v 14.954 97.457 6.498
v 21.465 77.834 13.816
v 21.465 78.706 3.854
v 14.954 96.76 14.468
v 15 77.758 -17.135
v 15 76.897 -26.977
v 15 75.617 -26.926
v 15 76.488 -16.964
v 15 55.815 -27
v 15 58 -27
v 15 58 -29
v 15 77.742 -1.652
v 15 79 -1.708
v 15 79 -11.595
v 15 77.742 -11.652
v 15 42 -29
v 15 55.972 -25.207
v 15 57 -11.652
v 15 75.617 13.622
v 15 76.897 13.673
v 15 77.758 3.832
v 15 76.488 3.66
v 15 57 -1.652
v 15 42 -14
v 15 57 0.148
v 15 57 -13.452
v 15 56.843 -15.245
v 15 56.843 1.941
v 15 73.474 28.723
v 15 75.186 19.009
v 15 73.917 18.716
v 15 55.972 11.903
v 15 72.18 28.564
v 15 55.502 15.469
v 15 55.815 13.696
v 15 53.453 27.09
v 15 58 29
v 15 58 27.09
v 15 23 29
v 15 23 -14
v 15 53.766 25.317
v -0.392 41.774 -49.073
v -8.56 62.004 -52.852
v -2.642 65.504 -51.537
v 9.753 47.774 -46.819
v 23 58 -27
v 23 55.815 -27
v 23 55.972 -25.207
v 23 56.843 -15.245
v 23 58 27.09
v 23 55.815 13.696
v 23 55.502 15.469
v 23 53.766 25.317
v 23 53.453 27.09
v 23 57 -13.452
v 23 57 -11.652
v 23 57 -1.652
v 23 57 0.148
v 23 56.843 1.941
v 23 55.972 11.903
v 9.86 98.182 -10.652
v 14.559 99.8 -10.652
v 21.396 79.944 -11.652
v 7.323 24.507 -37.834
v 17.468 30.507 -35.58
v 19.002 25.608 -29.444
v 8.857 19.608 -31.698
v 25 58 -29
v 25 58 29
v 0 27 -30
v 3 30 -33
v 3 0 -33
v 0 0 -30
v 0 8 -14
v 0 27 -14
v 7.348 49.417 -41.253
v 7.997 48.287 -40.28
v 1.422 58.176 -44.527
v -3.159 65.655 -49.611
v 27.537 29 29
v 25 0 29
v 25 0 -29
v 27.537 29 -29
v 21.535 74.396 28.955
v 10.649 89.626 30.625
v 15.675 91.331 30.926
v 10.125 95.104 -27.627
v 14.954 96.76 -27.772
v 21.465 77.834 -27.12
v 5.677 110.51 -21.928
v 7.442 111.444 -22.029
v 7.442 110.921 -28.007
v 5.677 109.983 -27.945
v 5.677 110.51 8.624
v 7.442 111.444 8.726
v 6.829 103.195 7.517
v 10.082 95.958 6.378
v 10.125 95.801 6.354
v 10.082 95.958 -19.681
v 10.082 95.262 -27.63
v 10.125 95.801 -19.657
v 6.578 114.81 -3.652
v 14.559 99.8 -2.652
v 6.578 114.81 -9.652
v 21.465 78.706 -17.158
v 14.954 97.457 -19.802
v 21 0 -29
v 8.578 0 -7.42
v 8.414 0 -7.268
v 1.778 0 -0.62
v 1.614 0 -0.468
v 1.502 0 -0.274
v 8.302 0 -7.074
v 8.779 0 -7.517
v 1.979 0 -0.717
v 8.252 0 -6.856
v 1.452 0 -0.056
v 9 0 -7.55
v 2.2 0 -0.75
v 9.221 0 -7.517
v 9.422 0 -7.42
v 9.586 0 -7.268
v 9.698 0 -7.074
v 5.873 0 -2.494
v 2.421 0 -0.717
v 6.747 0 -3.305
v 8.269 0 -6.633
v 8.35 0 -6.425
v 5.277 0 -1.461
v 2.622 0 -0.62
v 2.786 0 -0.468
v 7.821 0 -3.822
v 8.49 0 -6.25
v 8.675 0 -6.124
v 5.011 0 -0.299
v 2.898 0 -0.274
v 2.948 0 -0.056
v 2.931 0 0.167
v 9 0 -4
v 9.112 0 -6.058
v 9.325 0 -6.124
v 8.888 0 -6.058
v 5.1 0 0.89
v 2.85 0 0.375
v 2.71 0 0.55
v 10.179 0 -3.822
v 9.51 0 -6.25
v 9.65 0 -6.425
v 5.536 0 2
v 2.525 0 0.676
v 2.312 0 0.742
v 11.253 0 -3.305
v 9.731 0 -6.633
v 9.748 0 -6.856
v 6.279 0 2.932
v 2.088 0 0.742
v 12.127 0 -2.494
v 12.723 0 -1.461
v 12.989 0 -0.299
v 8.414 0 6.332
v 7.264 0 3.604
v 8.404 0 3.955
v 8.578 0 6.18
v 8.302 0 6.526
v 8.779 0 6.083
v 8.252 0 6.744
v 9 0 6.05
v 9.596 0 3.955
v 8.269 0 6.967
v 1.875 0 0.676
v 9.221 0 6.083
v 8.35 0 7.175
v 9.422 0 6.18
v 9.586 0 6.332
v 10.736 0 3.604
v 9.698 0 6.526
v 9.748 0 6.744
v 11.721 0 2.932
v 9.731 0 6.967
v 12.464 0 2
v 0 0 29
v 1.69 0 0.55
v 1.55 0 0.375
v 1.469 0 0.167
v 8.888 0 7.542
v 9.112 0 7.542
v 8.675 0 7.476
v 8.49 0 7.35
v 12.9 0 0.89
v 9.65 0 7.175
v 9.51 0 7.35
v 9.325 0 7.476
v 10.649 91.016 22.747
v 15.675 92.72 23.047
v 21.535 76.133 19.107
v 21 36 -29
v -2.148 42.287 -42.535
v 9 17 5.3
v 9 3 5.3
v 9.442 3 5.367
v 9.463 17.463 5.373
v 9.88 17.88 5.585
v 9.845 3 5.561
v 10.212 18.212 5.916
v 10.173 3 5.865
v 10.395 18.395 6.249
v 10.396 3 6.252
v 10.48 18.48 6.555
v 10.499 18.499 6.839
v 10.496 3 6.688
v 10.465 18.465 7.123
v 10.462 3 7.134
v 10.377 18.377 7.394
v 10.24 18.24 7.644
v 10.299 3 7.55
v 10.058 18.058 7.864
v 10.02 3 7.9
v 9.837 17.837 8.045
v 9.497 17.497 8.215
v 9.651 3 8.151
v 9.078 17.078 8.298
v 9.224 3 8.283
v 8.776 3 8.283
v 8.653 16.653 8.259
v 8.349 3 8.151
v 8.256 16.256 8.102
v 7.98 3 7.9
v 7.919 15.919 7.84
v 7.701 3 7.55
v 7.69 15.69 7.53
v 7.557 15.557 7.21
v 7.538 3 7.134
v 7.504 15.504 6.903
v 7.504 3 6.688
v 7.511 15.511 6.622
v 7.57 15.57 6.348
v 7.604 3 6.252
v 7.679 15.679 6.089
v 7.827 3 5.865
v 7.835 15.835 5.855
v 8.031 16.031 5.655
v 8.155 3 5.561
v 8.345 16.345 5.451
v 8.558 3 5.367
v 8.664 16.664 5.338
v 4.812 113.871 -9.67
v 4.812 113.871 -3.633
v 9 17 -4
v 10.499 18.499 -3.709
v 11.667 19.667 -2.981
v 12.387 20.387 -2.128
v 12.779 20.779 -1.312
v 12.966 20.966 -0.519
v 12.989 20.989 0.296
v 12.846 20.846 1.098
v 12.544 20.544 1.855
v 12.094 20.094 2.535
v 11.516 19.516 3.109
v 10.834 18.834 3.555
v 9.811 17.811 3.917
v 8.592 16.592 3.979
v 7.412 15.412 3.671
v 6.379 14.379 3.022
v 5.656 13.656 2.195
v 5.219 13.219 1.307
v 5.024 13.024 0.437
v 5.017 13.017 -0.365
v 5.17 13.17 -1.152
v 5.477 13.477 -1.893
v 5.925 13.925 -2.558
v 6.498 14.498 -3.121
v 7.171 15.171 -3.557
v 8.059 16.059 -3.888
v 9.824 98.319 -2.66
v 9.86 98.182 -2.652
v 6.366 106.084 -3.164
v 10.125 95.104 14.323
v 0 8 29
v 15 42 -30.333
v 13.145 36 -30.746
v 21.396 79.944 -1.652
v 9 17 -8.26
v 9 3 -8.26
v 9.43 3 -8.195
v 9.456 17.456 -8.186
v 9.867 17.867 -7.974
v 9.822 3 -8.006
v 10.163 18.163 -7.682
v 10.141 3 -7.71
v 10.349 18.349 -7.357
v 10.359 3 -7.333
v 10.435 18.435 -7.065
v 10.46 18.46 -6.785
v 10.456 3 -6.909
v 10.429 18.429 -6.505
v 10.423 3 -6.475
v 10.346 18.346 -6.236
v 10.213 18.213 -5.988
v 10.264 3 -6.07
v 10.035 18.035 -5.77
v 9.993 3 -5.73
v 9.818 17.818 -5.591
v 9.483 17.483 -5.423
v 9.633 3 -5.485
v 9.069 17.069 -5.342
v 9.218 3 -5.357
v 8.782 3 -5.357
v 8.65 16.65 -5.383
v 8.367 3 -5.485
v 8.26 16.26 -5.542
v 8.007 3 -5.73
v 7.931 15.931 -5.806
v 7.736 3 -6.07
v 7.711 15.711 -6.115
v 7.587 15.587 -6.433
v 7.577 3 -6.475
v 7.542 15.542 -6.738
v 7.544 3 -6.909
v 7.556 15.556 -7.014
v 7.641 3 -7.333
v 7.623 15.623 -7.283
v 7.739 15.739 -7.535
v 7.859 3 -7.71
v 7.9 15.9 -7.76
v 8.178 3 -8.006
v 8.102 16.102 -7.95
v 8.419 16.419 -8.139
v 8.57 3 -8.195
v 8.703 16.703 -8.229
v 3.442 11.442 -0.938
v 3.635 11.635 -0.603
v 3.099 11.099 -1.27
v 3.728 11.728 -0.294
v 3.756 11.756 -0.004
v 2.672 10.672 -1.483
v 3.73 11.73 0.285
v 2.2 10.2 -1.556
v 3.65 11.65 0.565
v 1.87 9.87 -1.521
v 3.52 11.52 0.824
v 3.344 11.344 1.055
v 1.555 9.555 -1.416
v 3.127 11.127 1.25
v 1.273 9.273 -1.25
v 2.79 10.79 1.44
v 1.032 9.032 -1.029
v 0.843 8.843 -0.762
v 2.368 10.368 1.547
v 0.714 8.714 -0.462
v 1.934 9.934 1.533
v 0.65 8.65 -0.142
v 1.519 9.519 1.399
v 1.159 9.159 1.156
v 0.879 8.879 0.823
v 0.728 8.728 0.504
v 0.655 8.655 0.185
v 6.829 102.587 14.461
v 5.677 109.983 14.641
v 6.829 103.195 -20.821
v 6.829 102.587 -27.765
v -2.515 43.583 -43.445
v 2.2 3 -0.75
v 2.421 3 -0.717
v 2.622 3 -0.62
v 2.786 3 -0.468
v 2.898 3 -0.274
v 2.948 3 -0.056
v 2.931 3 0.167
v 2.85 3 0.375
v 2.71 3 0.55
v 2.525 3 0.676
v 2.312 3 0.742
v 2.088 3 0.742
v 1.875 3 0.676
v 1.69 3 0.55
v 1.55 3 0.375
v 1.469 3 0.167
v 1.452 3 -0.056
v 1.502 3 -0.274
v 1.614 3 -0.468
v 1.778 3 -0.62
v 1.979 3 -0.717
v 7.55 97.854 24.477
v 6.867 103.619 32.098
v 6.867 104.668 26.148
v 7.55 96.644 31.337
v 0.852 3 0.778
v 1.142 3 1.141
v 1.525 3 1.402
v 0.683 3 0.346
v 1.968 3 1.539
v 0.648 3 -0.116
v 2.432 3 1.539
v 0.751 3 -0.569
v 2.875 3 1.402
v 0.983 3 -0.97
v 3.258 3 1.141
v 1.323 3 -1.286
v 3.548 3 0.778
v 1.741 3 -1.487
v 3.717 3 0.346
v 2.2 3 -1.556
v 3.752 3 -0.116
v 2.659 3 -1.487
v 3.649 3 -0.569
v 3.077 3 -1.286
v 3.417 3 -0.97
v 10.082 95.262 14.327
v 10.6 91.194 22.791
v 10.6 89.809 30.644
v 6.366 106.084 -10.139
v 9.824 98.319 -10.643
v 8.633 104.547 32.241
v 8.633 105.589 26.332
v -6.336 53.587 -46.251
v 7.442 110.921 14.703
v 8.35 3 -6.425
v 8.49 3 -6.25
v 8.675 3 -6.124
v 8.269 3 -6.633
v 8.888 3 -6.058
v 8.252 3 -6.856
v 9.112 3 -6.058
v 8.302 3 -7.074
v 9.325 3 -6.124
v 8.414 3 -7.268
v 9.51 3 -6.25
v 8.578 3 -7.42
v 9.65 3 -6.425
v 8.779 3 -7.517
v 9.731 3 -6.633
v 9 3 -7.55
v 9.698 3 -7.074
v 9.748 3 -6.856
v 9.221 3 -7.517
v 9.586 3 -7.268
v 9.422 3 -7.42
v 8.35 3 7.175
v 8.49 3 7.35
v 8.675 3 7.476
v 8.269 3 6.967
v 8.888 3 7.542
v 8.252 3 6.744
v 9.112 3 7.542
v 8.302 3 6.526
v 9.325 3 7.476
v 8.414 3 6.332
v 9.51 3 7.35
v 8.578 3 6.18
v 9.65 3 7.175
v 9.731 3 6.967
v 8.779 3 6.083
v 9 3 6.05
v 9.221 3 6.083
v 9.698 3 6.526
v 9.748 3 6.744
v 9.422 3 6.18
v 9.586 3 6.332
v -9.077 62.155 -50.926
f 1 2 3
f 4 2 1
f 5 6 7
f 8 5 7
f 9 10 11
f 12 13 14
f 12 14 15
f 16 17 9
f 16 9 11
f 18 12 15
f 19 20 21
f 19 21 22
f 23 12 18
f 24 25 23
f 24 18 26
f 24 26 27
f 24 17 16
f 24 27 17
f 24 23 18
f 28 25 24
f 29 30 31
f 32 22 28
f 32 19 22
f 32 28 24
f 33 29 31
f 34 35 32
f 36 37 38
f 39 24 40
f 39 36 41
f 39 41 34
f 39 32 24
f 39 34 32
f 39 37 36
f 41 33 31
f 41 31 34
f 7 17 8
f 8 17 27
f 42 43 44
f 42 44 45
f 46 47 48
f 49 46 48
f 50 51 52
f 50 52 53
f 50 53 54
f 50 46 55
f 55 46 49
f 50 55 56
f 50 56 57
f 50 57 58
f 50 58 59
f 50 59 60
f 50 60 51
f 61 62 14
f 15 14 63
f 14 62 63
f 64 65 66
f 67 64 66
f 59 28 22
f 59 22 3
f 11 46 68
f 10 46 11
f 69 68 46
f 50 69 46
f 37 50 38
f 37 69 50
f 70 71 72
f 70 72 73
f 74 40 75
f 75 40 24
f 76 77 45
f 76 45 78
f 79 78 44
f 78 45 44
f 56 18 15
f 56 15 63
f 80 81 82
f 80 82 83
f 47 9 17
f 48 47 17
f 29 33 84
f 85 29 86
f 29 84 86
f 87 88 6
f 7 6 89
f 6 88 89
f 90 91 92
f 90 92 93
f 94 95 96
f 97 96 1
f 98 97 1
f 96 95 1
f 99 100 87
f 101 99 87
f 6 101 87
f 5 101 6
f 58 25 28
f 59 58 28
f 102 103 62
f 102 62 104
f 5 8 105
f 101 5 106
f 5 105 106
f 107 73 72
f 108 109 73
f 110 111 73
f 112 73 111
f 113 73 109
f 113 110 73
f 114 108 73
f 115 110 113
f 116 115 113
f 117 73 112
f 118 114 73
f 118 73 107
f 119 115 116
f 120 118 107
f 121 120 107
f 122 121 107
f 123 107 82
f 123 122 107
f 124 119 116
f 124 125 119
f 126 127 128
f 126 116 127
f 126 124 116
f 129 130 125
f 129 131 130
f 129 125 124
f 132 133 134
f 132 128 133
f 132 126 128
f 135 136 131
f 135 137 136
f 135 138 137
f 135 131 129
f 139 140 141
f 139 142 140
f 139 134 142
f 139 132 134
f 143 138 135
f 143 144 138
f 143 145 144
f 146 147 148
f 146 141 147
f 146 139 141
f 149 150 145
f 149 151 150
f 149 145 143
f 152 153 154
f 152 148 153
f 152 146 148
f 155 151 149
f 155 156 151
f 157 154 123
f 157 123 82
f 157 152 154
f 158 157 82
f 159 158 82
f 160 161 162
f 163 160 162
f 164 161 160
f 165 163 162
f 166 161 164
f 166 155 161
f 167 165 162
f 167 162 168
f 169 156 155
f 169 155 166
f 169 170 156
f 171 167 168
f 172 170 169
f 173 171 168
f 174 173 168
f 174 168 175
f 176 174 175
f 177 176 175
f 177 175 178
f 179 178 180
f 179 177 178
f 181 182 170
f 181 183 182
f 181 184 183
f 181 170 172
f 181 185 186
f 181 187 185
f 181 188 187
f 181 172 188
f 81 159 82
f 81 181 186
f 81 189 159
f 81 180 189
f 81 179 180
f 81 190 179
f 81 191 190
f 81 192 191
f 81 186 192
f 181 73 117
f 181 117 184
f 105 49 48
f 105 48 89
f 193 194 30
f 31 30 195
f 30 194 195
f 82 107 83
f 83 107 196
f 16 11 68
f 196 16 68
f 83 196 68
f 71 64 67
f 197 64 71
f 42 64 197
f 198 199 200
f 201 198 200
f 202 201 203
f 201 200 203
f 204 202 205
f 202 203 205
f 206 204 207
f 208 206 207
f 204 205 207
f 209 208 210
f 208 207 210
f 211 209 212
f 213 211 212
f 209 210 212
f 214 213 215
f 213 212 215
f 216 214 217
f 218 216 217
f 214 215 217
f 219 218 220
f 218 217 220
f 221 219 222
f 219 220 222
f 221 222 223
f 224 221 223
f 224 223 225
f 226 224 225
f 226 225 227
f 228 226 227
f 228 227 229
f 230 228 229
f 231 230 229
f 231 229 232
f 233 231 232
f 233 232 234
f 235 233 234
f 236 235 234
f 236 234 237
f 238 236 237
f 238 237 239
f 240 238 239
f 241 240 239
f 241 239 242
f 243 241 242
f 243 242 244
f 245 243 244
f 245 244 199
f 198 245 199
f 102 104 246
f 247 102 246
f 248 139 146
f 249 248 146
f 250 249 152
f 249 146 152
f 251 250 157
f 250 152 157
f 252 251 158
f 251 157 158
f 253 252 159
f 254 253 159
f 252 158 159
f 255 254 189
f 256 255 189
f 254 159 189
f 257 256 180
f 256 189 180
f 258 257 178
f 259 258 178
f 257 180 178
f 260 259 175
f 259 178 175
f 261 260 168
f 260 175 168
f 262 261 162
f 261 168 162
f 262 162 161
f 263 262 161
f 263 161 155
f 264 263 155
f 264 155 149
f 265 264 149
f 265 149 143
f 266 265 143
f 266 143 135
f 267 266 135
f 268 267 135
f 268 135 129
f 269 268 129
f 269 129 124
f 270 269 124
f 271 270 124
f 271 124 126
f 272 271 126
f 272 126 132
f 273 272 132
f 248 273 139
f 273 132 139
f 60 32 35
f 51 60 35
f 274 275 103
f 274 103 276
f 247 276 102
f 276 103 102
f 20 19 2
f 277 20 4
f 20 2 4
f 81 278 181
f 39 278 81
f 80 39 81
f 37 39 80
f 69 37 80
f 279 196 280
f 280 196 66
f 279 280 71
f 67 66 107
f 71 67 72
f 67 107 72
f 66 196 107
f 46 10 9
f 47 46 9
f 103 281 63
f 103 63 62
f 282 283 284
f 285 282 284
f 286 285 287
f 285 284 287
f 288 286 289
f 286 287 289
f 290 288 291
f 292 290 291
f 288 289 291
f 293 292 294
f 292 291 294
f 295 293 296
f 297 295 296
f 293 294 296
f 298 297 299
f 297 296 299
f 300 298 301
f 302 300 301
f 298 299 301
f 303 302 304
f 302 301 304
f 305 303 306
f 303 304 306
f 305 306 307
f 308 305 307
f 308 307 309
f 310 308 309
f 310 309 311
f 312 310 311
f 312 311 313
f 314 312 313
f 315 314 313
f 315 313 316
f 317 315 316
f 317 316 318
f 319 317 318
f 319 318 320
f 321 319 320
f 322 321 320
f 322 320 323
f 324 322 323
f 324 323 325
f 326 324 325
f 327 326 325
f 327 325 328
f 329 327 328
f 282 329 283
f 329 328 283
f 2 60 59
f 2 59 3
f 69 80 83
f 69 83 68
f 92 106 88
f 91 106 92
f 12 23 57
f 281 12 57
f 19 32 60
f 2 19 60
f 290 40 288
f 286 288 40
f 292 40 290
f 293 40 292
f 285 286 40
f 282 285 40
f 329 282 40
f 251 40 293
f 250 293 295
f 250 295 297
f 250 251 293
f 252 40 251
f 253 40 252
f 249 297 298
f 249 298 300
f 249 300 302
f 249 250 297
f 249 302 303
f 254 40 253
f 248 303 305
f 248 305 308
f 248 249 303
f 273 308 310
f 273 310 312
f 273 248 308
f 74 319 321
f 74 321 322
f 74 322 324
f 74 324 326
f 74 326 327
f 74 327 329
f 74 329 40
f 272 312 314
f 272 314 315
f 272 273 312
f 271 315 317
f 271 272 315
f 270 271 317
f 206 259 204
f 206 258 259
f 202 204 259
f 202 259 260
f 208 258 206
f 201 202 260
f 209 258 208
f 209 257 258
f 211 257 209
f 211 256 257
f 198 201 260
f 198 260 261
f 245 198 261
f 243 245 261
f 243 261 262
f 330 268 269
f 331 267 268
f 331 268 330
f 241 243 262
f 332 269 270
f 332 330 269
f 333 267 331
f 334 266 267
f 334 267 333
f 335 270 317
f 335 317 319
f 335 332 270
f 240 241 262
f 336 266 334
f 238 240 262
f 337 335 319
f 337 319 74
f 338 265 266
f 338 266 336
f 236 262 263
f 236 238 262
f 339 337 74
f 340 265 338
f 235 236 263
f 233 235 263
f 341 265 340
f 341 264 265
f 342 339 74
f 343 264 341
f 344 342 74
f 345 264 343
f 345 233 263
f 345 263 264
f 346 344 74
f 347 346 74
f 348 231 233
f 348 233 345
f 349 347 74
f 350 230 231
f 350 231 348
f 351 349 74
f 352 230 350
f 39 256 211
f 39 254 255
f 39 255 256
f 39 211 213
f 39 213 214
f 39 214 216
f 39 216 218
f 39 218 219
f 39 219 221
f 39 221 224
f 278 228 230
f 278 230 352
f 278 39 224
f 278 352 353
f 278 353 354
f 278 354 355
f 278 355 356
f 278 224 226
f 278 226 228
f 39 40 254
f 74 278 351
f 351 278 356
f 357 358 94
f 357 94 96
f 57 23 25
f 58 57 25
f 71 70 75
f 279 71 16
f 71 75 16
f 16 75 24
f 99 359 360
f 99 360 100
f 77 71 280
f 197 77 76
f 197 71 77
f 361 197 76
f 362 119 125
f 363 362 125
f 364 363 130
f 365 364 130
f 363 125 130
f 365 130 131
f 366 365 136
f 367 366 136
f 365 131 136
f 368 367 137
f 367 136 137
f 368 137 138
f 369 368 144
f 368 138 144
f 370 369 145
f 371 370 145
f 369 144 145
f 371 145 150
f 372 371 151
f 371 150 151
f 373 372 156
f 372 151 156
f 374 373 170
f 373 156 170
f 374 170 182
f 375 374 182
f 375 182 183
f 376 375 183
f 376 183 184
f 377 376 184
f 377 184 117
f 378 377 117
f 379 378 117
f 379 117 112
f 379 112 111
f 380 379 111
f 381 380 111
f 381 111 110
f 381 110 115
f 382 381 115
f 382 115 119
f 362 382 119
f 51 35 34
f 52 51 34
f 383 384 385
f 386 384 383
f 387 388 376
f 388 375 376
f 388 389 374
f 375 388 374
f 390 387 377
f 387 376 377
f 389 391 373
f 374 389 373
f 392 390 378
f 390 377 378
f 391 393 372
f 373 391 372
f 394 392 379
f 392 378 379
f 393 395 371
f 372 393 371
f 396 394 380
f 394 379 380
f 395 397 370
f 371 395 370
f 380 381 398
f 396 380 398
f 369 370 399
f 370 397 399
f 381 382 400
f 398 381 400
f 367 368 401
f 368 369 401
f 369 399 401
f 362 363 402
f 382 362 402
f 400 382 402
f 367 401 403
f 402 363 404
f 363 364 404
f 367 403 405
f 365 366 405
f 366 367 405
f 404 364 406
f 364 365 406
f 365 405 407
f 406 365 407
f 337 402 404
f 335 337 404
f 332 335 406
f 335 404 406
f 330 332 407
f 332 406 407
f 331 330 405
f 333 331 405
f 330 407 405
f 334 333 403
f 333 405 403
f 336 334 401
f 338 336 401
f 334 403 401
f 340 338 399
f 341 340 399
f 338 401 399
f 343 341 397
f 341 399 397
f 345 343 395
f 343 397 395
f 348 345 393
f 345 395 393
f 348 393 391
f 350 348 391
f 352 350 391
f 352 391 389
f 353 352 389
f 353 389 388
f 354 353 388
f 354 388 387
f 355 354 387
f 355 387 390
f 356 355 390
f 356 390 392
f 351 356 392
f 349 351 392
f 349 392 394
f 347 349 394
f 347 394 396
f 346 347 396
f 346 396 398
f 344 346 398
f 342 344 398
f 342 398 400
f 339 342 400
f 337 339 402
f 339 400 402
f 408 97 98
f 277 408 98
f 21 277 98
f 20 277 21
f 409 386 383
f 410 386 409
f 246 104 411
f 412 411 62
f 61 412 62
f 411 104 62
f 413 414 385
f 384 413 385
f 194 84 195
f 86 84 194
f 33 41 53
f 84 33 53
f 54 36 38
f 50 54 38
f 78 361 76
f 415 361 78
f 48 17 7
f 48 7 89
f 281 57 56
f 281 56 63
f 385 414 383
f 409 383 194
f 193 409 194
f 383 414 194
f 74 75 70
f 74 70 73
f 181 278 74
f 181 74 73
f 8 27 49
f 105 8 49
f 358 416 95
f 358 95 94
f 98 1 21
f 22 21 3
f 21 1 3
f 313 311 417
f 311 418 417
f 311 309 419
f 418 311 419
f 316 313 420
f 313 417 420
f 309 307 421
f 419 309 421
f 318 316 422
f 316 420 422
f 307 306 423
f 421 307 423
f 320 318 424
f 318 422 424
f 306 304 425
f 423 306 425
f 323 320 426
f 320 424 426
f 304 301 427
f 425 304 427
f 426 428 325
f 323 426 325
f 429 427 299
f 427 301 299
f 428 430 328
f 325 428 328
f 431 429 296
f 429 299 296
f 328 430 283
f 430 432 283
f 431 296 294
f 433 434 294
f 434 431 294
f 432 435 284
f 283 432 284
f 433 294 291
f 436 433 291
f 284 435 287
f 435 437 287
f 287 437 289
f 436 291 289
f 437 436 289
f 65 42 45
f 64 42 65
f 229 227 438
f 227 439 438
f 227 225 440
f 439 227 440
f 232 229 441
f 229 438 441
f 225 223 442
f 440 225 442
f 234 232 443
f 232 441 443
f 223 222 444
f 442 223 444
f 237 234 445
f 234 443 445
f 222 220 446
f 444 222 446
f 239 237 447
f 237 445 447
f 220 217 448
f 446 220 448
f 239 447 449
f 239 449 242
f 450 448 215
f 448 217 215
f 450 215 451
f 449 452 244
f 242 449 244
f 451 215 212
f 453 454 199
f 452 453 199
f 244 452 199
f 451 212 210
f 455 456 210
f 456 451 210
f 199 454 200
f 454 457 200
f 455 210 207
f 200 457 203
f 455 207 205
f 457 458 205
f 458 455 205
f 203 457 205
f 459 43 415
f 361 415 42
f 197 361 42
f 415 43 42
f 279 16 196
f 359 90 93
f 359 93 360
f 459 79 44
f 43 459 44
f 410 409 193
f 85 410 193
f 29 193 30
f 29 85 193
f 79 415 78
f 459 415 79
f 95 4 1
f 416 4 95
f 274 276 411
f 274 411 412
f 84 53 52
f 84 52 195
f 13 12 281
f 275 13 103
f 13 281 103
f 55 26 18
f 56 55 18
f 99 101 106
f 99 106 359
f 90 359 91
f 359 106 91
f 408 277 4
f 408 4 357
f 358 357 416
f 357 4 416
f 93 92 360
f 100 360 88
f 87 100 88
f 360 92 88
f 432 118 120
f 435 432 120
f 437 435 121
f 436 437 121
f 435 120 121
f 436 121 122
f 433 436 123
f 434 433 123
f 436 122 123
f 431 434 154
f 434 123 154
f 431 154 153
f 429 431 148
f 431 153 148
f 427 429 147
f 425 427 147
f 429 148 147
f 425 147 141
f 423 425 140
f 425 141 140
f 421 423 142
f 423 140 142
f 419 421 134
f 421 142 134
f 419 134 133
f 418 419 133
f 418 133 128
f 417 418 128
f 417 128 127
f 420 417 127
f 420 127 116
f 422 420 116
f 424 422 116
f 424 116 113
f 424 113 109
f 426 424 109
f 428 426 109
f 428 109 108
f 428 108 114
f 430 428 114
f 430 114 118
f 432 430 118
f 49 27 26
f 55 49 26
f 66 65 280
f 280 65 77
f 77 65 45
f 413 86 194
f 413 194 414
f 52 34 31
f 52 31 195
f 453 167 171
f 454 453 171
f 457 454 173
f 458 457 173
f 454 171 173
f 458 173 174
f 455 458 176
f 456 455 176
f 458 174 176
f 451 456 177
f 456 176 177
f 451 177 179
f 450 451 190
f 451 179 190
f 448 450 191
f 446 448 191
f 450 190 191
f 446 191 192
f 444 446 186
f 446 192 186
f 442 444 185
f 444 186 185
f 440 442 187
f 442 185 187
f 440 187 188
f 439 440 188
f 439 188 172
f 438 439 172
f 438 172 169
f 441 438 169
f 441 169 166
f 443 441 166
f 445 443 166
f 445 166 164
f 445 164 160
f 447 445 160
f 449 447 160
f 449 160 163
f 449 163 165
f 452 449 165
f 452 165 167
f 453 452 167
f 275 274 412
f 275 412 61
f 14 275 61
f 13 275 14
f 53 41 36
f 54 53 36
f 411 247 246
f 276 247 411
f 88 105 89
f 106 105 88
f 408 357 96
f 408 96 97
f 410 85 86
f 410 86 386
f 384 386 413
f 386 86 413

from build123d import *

# Parameters (mm, degrees)
EXTRUDE_1_DEPTH      = 29
CUT_EXTRUDE_1_DEPTH  = 8
EXTRUDE_3_DEPTH      = 5
EXTRUDE_4_DEPTH      = 5
EXTRUDE_7_DEPTH      = 5
EXTRUDE_8_DEPTH      = 5
CUT_EXTRUDE_2_DEPTH  = 8
CUT_EXTRUDE_3_DEPTH  = 8
CUT_EXTRUDE_4_DEPTH  = 8
CUT_EXTRUDE_5_DEPTH  = 8
EXTRUDE_9_DEPTH      = 4
EXTRUDE_9_DEPTH_BACK = 15
CUT_EXTRUDE_6_DEPTH  = 123.591294734
EXTRUDE_10_DEPTH     = 12
CUT_EXTRUDE_7_DEPTH  = 10
CUT_EXTRUDE_8_REACH  = 131.356
SKETCH_19_R          = 4
SKETCH_19_R_2        = 0.75
CUT_EXTRUDE_9_REACH  = 128.701
SKETCH_20_R          = 1.459599559
SKETCH_20_R_2        = 1.556195018
SKETCH_20_R_3        = 1.5


with BuildPart() as part:
    # 草图1 → 凸台-拉伸1 (new, symmetric)
    with BuildSketch(Plane.XY):
        Polygon((0, 0), (25, 0), (27.537171242, 29), (25, 58), (15, 58), (15, 23), (0, 8), align=None)
    extrude(amount=EXTRUDE_1_DEPTH, both=True)

    # 草图2 → 切除-拉伸1 (cut)
    with BuildSketch(Plane.ZY.offset(-15)):
        Polygon((-27, 58), (-27, 55.814681899), (-13.451752106, 57), (0.148247894, 57), (13.696495788, 55.814681899), (27.089881229, 53.453066682), (27.089881229, 58), align=None)
    extrude(amount=-CUT_EXTRUDE_1_DEPTH, mode=Mode.SUBTRACT)

    # 草图3 → 凸台-拉伸3 (add, symmetric)
    with BuildSketch(Plane(origin=(15, 56.407340949, -20.225876053), x_dir=(1, 0, 0), z_dir=(0, 0.08715574274765847, 0.9961946980917457))):
        Polygon((-9.323445702, 54.044998978), (-8.171455002, 46.660954361), (-4.917561857, 39.352590699), (0, 21), (0, 0), (8, 0), (6.465357578, 21.946409106), (-0.046005512, 40.856780618), (-7.557550516, 54.983942103), align=None)
    extrude(amount=EXTRUDE_3_DEPTH, both=True)

    # 草图4 → 凸台-拉伸4 (add, symmetric)
    with BuildSketch(Plane(origin=(15, 57, -6.651752106), x_dir=(1, 0, 0), z_dir=(0, 0, 1))):
        Polygon((0, 0), (8, 0), (6.395601104, 22.943973156), (-0.44133014, 42.799863244), (-8.422346707, 57.809972322), (-10.188241893, 56.871029197), (-8.633642368, 49.083652916), (-5.176380902, 41.318516526), (0, 22), align=None)
    extrude(amount=EXTRUDE_4_DEPTH, both=True)

    # 草图5 → 凸台-拉伸7 (add, symmetric)
    with BuildSketch(Plane(origin=(15, 56.407340949, 6.922371841), x_dir=(1, 0, 0), z_dir=(0, -0.08715574274765847, 0.9961946980917457))):
        Polygon((0, 0), (8, 0), (6.465357578, 21.946409106), (-0.046005512, 40.856780618), (-7.557550516, 54.983942103), (-9.323445702, 54.044998978), (-8.171455002, 46.660954361), (-4.917561857, 39.352590699), (0, 21), align=None)
    extrude(amount=EXTRUDE_7_DEPTH, both=True)

    # 草图6 → 凸台-拉伸8 (add, symmetric)
    with BuildSketch(Plane(origin=(15, 54.63387429, 20.393188509), x_dir=(1, 0, 0), z_dir=(0, -0.17364817766693064, 0.9848077530122081))):
        Polygon((0, 0), (8, 0), (6.535114051, 20.948845055), (0.674887271, 37.968179416), (-6.367186171, 51.212393309), (-8.133081356, 50.273450184), (-7.45044859, 43.272329979), (-4.399923767, 36.420739047), (0, 20), align=None)
    extrude(amount=EXTRUDE_8_DEPTH, both=True)

    # 草图9 → 切除-拉伸2 (cut)
    with BuildSketch(Plane(origin=(43.786407244, 15.019497062, -1.314035725), x_dir=(-0.027653196730496193, -0.006835672416694662, -0.9995942048117308), z_dir=(0.945518575599319, 0.32432926933772815, -0.028375134316697356))):
        Polygon((16.019101355, 67.443389025), (18.714253027, 87.286175055), (21.05291991, 102.947141542), (27.031237201, 102.437511905), (26.685342748, 86.606668873), (25.982963507, 66.594006296), (29.629783933, 109.373797793), (19.665921781, 110.223180522), align=None)
    extrude(amount=-CUT_EXTRUDE_2_DEPTH, mode=Mode.SUBTRACT)

    # 草图10 → 切除-拉伸3 (cut)
    with BuildSketch(Plane(origin=(43.736994655, 15.059854982, 0), x_dir=(0, 0, -1), z_dir=(0.9455185755993187, 0.32556815445715115, 0))):
        Polygon((1.651752106, 68.622785261), (2.651752106, 89.622785261), (3.651752106, 106.413487051), (9.651752106, 106.413487051), (10.651752106, 89.622785261), (11.651752106, 68.622785261), (11.651752106, 115.571899367), (1.651752106, 115.571899367), align=None)
    extrude(amount=-CUT_EXTRUDE_3_DEPTH, mode=Mode.SUBTRACT)

    # 草图11 → 切除-拉伸4 (cut)
    with BuildSketch(Plane(origin=(43.429484648, 14.897066422, 1.303324432), x_dir=(0.02765319673049623, 0.006835672416694678, -0.9995942048117308), z_dir=(0.9455185755993187, 0.32432926933772854, 0.028375134316697394))):
        Polygon((-12.684857793, 66.627338038), (-13.387237034, 86.640000614), (-13.733131487, 102.470843646), (-7.754814196, 102.980473283), (-5.416147313, 87.319506797), (-2.720995641, 67.476720766), (-6.546649191, 112.354351713), (-16.478235605, 111.126351676), align=None)
    extrude(amount=-CUT_EXTRUDE_4_DEPTH, mode=Mode.SUBTRACT)

    # 草图12 → 切除-拉伸5 (cut)
    with BuildSketch(Plane(origin=(43.353791536, 14.701119108, 2.592203945), x_dir=(0.05512742044977168, 0.013471340172277213, -0.9983884467022428), z_dir=(0.9455185755993187, 0.32062204264327854, 0.0565343167278701))):
        Polygon((-26.718901534, 63.408631661), (-28.781224347, 81.318037698), (-30.304296285, 96.088755689), (-24.390936546, 97.104716612), (-20.896744695, 82.672652262), (-16.863301969, 65.101899866), (-23.990371814, 106.58472359), (-33.845971379, 104.891455385), align=None)
    extrude(amount=-CUT_EXTRUDE_5_DEPTH, mode=Mode.SUBTRACT)

    # 草图13 → 凸台-拉伸9 (add, two sides: drawn at the far end of the back side and taken through both)
    with BuildSketch(Plane(origin=(0, 0, -29), x_dir=(-1, 0, 0), z_dir=(0, 0, -1)).offset(-EXTRUDE_9_DEPTH_BACK)):
        Polygon((-15, 42), (-21, 36), (-21, 0), (0, 0), (0, 27), align=None)
    extrude(amount=EXTRUDE_9_DEPTH + EXTRUDE_9_DEPTH_BACK)

    # 草图14 → 切除-拉伸6 (cut, through all)
    with BuildSketch(Plane.XZ):
        Polygon((21, -29), (3, -33), (0, -30), (0, -35.356420502), (21, -35.356420502), (21, -33), align=None)
    extrude(amount=-CUT_EXTRUDE_6_DEPTH, mode=Mode.SUBTRACT)

    # 草图17 → 凸台-拉伸10 (add)
    with BuildSketch(Plane(origin=(9.583983071, 5.668293949, 2.129774016), x_dir=(-0.4880935300919712, 0.8660254037844418, -0.10846522890932642), z_dir=(-0.845402792964955, -0.4999999999999946, -0.18786728732554522))):
        Polygon((28.095834077, 32.86496436), (43.684291345, 41.86496436), (54.517176629, 43.775094314), (63.782054485, 47.744457312), (63.607743, 49.736846708), (41.691459642, 47.819420367), (21.752688327, 38.521818609), (16.095834077, 32.86496436), align=None)
    extrude(amount=-EXTRUDE_10_DEPTH)

    # 草图18 → 切除-拉伸7 (cut)
    with BuildSketch(Plane(origin=(11.38136915, -3.321366881, -42.376498538), x_dir=(-0.9659724085627504, -0.020280380390013637, -0.25784881629884493), z_dir=(0.2586451260790556, -0.07547908730517995, -0.9630190061131331))):
        Polygon((1.682136929, 51.286517247), (14.512238635, 69.331973467), (20.638759875, 65.945863974), (12.184744769, 45.481758116), (26.51939396, 71.417580015), (15.357154401, 76.028860982), align=None)
    extrude(amount=-CUT_EXTRUDE_7_DEPTH, mode=Mode.SUBTRACT)

    # 切除-拉伸8: up to this plane
    cut_extrude_8_end = Plane(origin=(15, 23, 29), z_dir=(0.7071067811865438, -0.7071067811865512, 0))
    # 草图19 → 切除-拉伸8 (cut, up to the surface)
    with BuildSketch(Plane.XZ, mode=Mode.PRIVATE) as cut_extrude_8_sk1:
        with Locations(Location((9, 0, 0), (0, 0, 270))):
            Circle(SKETCH_19_R)
    cut_extrude_8_tool1 = split(extrude(cut_extrude_8_sk1.sketch, amount=-CUT_EXTRUDE_8_REACH, mode=Mode.PRIVATE), bisect_by=cut_extrude_8_end, keep=Keep.BOTH, mode=Mode.PRIVATE)
    add(cut_extrude_8_tool1.solids().sort_by_distance((9, 0, 0))[0], mode=Mode.SUBTRACT)
    # 草图19 → 切除-拉伸8 (cut, up to the surface)
    with BuildSketch(Plane.XZ, mode=Mode.PRIVATE) as cut_extrude_8_sk2:
        with Locations(Location((2.2, 0, 0), (0, 0, 270))):
            Circle(SKETCH_19_R_2)
    cut_extrude_8_tool2 = split(extrude(cut_extrude_8_sk2.sketch, amount=-CUT_EXTRUDE_8_REACH, mode=Mode.PRIVATE), bisect_by=cut_extrude_8_end, keep=Keep.BOTH, mode=Mode.PRIVATE)
    add(cut_extrude_8_tool2.solids().sort_by_distance((2.2, 0, 0))[0], mode=Mode.SUBTRACT)
    # 草图19 → 切除-拉伸8 (cut, up to the surface)
    with BuildSketch(Plane.XZ, mode=Mode.PRIVATE) as cut_extrude_8_sk3:
        with Locations(Location((9, 6.8, 0), (0, 0, 270))):
            Circle(SKETCH_19_R_2)
    cut_extrude_8_tool3 = split(extrude(cut_extrude_8_sk3.sketch, amount=-CUT_EXTRUDE_8_REACH, mode=Mode.PRIVATE), bisect_by=cut_extrude_8_end, keep=Keep.BOTH, mode=Mode.PRIVATE)
    add(cut_extrude_8_tool3.solids().sort_by_distance((9, 0, 6.8))[0], mode=Mode.SUBTRACT)
    # 草图19 → 切除-拉伸8 (cut, up to the surface)
    with BuildSketch(Plane.XZ, mode=Mode.PRIVATE) as cut_extrude_8_sk4:
        with Locations(Location((9, -6.8, 0), (0, 0, 270))):
            Circle(SKETCH_19_R_2)
    cut_extrude_8_tool4 = split(extrude(cut_extrude_8_sk4.sketch, amount=-CUT_EXTRUDE_8_REACH, mode=Mode.PRIVATE), bisect_by=cut_extrude_8_end, keep=Keep.BOTH, mode=Mode.PRIVATE)
    add(cut_extrude_8_tool4.solids().sort_by_distance((9, 0, -6.8))[0], mode=Mode.SUBTRACT)

    # 切除-拉伸9: up to this plane
    cut_extrude_9_end = Plane(origin=(15, 23, 29), z_dir=(0.7071067811865438, -0.7071067811865512, 0))
    # 草图20 → 切除-拉伸9 (cut, up to the surface)
    with BuildSketch(Plane(origin=(0, 3, 0), x_dir=(-1, 0, 0), z_dir=(0, -1, 0)), mode=Mode.PRIVATE) as cut_extrude_9_sk1:
        with Locations(Location((-9, 6.8, 0), (0, 0, 90))):
            Circle(SKETCH_20_R)
    cut_extrude_9_tool1 = split(extrude(cut_extrude_9_sk1.sketch, amount=-CUT_EXTRUDE_9_REACH, mode=Mode.PRIVATE), bisect_by=cut_extrude_9_end, keep=Keep.BOTH, mode=Mode.PRIVATE)
    add(cut_extrude_9_tool1.solids().sort_by_distance((9, 3, -6.8))[0], mode=Mode.SUBTRACT)
    # 草图20 → 切除-拉伸9 (cut, up to the surface)
    with BuildSketch(Plane(origin=(0, 3, 0), x_dir=(-1, 0, 0), z_dir=(0, -1, 0)), mode=Mode.PRIVATE) as cut_extrude_9_sk2:
        with Locations(Location((-2.2, 0, 0), (0, 0, 90))):
            Circle(SKETCH_20_R_2)
    cut_extrude_9_tool2 = split(extrude(cut_extrude_9_sk2.sketch, amount=-CUT_EXTRUDE_9_REACH, mode=Mode.PRIVATE), bisect_by=cut_extrude_9_end, keep=Keep.BOTH, mode=Mode.PRIVATE)
    add(cut_extrude_9_tool2.solids().sort_by_distance((2.2, 3, 0))[0], mode=Mode.SUBTRACT)
    # 草图20 → 切除-拉伸9 (cut, up to the surface)
    with BuildSketch(Plane(origin=(0, 3, 0), x_dir=(-1, 0, 0), z_dir=(0, -1, 0)), mode=Mode.PRIVATE) as cut_extrude_9_sk3:
        with Locations(Location((-9, -6.8, 0), (0, 0, 90))):
            Circle(SKETCH_20_R_3)
    cut_extrude_9_tool3 = split(extrude(cut_extrude_9_sk3.sketch, amount=-CUT_EXTRUDE_9_REACH, mode=Mode.PRIVATE), bisect_by=cut_extrude_9_end, keep=Keep.BOTH, mode=Mode.PRIVATE)
    add(cut_extrude_9_tool3.solids().sort_by_distance((9, 3, 6.8))[0], mode=Mode.SUBTRACT)


solid = part.part
